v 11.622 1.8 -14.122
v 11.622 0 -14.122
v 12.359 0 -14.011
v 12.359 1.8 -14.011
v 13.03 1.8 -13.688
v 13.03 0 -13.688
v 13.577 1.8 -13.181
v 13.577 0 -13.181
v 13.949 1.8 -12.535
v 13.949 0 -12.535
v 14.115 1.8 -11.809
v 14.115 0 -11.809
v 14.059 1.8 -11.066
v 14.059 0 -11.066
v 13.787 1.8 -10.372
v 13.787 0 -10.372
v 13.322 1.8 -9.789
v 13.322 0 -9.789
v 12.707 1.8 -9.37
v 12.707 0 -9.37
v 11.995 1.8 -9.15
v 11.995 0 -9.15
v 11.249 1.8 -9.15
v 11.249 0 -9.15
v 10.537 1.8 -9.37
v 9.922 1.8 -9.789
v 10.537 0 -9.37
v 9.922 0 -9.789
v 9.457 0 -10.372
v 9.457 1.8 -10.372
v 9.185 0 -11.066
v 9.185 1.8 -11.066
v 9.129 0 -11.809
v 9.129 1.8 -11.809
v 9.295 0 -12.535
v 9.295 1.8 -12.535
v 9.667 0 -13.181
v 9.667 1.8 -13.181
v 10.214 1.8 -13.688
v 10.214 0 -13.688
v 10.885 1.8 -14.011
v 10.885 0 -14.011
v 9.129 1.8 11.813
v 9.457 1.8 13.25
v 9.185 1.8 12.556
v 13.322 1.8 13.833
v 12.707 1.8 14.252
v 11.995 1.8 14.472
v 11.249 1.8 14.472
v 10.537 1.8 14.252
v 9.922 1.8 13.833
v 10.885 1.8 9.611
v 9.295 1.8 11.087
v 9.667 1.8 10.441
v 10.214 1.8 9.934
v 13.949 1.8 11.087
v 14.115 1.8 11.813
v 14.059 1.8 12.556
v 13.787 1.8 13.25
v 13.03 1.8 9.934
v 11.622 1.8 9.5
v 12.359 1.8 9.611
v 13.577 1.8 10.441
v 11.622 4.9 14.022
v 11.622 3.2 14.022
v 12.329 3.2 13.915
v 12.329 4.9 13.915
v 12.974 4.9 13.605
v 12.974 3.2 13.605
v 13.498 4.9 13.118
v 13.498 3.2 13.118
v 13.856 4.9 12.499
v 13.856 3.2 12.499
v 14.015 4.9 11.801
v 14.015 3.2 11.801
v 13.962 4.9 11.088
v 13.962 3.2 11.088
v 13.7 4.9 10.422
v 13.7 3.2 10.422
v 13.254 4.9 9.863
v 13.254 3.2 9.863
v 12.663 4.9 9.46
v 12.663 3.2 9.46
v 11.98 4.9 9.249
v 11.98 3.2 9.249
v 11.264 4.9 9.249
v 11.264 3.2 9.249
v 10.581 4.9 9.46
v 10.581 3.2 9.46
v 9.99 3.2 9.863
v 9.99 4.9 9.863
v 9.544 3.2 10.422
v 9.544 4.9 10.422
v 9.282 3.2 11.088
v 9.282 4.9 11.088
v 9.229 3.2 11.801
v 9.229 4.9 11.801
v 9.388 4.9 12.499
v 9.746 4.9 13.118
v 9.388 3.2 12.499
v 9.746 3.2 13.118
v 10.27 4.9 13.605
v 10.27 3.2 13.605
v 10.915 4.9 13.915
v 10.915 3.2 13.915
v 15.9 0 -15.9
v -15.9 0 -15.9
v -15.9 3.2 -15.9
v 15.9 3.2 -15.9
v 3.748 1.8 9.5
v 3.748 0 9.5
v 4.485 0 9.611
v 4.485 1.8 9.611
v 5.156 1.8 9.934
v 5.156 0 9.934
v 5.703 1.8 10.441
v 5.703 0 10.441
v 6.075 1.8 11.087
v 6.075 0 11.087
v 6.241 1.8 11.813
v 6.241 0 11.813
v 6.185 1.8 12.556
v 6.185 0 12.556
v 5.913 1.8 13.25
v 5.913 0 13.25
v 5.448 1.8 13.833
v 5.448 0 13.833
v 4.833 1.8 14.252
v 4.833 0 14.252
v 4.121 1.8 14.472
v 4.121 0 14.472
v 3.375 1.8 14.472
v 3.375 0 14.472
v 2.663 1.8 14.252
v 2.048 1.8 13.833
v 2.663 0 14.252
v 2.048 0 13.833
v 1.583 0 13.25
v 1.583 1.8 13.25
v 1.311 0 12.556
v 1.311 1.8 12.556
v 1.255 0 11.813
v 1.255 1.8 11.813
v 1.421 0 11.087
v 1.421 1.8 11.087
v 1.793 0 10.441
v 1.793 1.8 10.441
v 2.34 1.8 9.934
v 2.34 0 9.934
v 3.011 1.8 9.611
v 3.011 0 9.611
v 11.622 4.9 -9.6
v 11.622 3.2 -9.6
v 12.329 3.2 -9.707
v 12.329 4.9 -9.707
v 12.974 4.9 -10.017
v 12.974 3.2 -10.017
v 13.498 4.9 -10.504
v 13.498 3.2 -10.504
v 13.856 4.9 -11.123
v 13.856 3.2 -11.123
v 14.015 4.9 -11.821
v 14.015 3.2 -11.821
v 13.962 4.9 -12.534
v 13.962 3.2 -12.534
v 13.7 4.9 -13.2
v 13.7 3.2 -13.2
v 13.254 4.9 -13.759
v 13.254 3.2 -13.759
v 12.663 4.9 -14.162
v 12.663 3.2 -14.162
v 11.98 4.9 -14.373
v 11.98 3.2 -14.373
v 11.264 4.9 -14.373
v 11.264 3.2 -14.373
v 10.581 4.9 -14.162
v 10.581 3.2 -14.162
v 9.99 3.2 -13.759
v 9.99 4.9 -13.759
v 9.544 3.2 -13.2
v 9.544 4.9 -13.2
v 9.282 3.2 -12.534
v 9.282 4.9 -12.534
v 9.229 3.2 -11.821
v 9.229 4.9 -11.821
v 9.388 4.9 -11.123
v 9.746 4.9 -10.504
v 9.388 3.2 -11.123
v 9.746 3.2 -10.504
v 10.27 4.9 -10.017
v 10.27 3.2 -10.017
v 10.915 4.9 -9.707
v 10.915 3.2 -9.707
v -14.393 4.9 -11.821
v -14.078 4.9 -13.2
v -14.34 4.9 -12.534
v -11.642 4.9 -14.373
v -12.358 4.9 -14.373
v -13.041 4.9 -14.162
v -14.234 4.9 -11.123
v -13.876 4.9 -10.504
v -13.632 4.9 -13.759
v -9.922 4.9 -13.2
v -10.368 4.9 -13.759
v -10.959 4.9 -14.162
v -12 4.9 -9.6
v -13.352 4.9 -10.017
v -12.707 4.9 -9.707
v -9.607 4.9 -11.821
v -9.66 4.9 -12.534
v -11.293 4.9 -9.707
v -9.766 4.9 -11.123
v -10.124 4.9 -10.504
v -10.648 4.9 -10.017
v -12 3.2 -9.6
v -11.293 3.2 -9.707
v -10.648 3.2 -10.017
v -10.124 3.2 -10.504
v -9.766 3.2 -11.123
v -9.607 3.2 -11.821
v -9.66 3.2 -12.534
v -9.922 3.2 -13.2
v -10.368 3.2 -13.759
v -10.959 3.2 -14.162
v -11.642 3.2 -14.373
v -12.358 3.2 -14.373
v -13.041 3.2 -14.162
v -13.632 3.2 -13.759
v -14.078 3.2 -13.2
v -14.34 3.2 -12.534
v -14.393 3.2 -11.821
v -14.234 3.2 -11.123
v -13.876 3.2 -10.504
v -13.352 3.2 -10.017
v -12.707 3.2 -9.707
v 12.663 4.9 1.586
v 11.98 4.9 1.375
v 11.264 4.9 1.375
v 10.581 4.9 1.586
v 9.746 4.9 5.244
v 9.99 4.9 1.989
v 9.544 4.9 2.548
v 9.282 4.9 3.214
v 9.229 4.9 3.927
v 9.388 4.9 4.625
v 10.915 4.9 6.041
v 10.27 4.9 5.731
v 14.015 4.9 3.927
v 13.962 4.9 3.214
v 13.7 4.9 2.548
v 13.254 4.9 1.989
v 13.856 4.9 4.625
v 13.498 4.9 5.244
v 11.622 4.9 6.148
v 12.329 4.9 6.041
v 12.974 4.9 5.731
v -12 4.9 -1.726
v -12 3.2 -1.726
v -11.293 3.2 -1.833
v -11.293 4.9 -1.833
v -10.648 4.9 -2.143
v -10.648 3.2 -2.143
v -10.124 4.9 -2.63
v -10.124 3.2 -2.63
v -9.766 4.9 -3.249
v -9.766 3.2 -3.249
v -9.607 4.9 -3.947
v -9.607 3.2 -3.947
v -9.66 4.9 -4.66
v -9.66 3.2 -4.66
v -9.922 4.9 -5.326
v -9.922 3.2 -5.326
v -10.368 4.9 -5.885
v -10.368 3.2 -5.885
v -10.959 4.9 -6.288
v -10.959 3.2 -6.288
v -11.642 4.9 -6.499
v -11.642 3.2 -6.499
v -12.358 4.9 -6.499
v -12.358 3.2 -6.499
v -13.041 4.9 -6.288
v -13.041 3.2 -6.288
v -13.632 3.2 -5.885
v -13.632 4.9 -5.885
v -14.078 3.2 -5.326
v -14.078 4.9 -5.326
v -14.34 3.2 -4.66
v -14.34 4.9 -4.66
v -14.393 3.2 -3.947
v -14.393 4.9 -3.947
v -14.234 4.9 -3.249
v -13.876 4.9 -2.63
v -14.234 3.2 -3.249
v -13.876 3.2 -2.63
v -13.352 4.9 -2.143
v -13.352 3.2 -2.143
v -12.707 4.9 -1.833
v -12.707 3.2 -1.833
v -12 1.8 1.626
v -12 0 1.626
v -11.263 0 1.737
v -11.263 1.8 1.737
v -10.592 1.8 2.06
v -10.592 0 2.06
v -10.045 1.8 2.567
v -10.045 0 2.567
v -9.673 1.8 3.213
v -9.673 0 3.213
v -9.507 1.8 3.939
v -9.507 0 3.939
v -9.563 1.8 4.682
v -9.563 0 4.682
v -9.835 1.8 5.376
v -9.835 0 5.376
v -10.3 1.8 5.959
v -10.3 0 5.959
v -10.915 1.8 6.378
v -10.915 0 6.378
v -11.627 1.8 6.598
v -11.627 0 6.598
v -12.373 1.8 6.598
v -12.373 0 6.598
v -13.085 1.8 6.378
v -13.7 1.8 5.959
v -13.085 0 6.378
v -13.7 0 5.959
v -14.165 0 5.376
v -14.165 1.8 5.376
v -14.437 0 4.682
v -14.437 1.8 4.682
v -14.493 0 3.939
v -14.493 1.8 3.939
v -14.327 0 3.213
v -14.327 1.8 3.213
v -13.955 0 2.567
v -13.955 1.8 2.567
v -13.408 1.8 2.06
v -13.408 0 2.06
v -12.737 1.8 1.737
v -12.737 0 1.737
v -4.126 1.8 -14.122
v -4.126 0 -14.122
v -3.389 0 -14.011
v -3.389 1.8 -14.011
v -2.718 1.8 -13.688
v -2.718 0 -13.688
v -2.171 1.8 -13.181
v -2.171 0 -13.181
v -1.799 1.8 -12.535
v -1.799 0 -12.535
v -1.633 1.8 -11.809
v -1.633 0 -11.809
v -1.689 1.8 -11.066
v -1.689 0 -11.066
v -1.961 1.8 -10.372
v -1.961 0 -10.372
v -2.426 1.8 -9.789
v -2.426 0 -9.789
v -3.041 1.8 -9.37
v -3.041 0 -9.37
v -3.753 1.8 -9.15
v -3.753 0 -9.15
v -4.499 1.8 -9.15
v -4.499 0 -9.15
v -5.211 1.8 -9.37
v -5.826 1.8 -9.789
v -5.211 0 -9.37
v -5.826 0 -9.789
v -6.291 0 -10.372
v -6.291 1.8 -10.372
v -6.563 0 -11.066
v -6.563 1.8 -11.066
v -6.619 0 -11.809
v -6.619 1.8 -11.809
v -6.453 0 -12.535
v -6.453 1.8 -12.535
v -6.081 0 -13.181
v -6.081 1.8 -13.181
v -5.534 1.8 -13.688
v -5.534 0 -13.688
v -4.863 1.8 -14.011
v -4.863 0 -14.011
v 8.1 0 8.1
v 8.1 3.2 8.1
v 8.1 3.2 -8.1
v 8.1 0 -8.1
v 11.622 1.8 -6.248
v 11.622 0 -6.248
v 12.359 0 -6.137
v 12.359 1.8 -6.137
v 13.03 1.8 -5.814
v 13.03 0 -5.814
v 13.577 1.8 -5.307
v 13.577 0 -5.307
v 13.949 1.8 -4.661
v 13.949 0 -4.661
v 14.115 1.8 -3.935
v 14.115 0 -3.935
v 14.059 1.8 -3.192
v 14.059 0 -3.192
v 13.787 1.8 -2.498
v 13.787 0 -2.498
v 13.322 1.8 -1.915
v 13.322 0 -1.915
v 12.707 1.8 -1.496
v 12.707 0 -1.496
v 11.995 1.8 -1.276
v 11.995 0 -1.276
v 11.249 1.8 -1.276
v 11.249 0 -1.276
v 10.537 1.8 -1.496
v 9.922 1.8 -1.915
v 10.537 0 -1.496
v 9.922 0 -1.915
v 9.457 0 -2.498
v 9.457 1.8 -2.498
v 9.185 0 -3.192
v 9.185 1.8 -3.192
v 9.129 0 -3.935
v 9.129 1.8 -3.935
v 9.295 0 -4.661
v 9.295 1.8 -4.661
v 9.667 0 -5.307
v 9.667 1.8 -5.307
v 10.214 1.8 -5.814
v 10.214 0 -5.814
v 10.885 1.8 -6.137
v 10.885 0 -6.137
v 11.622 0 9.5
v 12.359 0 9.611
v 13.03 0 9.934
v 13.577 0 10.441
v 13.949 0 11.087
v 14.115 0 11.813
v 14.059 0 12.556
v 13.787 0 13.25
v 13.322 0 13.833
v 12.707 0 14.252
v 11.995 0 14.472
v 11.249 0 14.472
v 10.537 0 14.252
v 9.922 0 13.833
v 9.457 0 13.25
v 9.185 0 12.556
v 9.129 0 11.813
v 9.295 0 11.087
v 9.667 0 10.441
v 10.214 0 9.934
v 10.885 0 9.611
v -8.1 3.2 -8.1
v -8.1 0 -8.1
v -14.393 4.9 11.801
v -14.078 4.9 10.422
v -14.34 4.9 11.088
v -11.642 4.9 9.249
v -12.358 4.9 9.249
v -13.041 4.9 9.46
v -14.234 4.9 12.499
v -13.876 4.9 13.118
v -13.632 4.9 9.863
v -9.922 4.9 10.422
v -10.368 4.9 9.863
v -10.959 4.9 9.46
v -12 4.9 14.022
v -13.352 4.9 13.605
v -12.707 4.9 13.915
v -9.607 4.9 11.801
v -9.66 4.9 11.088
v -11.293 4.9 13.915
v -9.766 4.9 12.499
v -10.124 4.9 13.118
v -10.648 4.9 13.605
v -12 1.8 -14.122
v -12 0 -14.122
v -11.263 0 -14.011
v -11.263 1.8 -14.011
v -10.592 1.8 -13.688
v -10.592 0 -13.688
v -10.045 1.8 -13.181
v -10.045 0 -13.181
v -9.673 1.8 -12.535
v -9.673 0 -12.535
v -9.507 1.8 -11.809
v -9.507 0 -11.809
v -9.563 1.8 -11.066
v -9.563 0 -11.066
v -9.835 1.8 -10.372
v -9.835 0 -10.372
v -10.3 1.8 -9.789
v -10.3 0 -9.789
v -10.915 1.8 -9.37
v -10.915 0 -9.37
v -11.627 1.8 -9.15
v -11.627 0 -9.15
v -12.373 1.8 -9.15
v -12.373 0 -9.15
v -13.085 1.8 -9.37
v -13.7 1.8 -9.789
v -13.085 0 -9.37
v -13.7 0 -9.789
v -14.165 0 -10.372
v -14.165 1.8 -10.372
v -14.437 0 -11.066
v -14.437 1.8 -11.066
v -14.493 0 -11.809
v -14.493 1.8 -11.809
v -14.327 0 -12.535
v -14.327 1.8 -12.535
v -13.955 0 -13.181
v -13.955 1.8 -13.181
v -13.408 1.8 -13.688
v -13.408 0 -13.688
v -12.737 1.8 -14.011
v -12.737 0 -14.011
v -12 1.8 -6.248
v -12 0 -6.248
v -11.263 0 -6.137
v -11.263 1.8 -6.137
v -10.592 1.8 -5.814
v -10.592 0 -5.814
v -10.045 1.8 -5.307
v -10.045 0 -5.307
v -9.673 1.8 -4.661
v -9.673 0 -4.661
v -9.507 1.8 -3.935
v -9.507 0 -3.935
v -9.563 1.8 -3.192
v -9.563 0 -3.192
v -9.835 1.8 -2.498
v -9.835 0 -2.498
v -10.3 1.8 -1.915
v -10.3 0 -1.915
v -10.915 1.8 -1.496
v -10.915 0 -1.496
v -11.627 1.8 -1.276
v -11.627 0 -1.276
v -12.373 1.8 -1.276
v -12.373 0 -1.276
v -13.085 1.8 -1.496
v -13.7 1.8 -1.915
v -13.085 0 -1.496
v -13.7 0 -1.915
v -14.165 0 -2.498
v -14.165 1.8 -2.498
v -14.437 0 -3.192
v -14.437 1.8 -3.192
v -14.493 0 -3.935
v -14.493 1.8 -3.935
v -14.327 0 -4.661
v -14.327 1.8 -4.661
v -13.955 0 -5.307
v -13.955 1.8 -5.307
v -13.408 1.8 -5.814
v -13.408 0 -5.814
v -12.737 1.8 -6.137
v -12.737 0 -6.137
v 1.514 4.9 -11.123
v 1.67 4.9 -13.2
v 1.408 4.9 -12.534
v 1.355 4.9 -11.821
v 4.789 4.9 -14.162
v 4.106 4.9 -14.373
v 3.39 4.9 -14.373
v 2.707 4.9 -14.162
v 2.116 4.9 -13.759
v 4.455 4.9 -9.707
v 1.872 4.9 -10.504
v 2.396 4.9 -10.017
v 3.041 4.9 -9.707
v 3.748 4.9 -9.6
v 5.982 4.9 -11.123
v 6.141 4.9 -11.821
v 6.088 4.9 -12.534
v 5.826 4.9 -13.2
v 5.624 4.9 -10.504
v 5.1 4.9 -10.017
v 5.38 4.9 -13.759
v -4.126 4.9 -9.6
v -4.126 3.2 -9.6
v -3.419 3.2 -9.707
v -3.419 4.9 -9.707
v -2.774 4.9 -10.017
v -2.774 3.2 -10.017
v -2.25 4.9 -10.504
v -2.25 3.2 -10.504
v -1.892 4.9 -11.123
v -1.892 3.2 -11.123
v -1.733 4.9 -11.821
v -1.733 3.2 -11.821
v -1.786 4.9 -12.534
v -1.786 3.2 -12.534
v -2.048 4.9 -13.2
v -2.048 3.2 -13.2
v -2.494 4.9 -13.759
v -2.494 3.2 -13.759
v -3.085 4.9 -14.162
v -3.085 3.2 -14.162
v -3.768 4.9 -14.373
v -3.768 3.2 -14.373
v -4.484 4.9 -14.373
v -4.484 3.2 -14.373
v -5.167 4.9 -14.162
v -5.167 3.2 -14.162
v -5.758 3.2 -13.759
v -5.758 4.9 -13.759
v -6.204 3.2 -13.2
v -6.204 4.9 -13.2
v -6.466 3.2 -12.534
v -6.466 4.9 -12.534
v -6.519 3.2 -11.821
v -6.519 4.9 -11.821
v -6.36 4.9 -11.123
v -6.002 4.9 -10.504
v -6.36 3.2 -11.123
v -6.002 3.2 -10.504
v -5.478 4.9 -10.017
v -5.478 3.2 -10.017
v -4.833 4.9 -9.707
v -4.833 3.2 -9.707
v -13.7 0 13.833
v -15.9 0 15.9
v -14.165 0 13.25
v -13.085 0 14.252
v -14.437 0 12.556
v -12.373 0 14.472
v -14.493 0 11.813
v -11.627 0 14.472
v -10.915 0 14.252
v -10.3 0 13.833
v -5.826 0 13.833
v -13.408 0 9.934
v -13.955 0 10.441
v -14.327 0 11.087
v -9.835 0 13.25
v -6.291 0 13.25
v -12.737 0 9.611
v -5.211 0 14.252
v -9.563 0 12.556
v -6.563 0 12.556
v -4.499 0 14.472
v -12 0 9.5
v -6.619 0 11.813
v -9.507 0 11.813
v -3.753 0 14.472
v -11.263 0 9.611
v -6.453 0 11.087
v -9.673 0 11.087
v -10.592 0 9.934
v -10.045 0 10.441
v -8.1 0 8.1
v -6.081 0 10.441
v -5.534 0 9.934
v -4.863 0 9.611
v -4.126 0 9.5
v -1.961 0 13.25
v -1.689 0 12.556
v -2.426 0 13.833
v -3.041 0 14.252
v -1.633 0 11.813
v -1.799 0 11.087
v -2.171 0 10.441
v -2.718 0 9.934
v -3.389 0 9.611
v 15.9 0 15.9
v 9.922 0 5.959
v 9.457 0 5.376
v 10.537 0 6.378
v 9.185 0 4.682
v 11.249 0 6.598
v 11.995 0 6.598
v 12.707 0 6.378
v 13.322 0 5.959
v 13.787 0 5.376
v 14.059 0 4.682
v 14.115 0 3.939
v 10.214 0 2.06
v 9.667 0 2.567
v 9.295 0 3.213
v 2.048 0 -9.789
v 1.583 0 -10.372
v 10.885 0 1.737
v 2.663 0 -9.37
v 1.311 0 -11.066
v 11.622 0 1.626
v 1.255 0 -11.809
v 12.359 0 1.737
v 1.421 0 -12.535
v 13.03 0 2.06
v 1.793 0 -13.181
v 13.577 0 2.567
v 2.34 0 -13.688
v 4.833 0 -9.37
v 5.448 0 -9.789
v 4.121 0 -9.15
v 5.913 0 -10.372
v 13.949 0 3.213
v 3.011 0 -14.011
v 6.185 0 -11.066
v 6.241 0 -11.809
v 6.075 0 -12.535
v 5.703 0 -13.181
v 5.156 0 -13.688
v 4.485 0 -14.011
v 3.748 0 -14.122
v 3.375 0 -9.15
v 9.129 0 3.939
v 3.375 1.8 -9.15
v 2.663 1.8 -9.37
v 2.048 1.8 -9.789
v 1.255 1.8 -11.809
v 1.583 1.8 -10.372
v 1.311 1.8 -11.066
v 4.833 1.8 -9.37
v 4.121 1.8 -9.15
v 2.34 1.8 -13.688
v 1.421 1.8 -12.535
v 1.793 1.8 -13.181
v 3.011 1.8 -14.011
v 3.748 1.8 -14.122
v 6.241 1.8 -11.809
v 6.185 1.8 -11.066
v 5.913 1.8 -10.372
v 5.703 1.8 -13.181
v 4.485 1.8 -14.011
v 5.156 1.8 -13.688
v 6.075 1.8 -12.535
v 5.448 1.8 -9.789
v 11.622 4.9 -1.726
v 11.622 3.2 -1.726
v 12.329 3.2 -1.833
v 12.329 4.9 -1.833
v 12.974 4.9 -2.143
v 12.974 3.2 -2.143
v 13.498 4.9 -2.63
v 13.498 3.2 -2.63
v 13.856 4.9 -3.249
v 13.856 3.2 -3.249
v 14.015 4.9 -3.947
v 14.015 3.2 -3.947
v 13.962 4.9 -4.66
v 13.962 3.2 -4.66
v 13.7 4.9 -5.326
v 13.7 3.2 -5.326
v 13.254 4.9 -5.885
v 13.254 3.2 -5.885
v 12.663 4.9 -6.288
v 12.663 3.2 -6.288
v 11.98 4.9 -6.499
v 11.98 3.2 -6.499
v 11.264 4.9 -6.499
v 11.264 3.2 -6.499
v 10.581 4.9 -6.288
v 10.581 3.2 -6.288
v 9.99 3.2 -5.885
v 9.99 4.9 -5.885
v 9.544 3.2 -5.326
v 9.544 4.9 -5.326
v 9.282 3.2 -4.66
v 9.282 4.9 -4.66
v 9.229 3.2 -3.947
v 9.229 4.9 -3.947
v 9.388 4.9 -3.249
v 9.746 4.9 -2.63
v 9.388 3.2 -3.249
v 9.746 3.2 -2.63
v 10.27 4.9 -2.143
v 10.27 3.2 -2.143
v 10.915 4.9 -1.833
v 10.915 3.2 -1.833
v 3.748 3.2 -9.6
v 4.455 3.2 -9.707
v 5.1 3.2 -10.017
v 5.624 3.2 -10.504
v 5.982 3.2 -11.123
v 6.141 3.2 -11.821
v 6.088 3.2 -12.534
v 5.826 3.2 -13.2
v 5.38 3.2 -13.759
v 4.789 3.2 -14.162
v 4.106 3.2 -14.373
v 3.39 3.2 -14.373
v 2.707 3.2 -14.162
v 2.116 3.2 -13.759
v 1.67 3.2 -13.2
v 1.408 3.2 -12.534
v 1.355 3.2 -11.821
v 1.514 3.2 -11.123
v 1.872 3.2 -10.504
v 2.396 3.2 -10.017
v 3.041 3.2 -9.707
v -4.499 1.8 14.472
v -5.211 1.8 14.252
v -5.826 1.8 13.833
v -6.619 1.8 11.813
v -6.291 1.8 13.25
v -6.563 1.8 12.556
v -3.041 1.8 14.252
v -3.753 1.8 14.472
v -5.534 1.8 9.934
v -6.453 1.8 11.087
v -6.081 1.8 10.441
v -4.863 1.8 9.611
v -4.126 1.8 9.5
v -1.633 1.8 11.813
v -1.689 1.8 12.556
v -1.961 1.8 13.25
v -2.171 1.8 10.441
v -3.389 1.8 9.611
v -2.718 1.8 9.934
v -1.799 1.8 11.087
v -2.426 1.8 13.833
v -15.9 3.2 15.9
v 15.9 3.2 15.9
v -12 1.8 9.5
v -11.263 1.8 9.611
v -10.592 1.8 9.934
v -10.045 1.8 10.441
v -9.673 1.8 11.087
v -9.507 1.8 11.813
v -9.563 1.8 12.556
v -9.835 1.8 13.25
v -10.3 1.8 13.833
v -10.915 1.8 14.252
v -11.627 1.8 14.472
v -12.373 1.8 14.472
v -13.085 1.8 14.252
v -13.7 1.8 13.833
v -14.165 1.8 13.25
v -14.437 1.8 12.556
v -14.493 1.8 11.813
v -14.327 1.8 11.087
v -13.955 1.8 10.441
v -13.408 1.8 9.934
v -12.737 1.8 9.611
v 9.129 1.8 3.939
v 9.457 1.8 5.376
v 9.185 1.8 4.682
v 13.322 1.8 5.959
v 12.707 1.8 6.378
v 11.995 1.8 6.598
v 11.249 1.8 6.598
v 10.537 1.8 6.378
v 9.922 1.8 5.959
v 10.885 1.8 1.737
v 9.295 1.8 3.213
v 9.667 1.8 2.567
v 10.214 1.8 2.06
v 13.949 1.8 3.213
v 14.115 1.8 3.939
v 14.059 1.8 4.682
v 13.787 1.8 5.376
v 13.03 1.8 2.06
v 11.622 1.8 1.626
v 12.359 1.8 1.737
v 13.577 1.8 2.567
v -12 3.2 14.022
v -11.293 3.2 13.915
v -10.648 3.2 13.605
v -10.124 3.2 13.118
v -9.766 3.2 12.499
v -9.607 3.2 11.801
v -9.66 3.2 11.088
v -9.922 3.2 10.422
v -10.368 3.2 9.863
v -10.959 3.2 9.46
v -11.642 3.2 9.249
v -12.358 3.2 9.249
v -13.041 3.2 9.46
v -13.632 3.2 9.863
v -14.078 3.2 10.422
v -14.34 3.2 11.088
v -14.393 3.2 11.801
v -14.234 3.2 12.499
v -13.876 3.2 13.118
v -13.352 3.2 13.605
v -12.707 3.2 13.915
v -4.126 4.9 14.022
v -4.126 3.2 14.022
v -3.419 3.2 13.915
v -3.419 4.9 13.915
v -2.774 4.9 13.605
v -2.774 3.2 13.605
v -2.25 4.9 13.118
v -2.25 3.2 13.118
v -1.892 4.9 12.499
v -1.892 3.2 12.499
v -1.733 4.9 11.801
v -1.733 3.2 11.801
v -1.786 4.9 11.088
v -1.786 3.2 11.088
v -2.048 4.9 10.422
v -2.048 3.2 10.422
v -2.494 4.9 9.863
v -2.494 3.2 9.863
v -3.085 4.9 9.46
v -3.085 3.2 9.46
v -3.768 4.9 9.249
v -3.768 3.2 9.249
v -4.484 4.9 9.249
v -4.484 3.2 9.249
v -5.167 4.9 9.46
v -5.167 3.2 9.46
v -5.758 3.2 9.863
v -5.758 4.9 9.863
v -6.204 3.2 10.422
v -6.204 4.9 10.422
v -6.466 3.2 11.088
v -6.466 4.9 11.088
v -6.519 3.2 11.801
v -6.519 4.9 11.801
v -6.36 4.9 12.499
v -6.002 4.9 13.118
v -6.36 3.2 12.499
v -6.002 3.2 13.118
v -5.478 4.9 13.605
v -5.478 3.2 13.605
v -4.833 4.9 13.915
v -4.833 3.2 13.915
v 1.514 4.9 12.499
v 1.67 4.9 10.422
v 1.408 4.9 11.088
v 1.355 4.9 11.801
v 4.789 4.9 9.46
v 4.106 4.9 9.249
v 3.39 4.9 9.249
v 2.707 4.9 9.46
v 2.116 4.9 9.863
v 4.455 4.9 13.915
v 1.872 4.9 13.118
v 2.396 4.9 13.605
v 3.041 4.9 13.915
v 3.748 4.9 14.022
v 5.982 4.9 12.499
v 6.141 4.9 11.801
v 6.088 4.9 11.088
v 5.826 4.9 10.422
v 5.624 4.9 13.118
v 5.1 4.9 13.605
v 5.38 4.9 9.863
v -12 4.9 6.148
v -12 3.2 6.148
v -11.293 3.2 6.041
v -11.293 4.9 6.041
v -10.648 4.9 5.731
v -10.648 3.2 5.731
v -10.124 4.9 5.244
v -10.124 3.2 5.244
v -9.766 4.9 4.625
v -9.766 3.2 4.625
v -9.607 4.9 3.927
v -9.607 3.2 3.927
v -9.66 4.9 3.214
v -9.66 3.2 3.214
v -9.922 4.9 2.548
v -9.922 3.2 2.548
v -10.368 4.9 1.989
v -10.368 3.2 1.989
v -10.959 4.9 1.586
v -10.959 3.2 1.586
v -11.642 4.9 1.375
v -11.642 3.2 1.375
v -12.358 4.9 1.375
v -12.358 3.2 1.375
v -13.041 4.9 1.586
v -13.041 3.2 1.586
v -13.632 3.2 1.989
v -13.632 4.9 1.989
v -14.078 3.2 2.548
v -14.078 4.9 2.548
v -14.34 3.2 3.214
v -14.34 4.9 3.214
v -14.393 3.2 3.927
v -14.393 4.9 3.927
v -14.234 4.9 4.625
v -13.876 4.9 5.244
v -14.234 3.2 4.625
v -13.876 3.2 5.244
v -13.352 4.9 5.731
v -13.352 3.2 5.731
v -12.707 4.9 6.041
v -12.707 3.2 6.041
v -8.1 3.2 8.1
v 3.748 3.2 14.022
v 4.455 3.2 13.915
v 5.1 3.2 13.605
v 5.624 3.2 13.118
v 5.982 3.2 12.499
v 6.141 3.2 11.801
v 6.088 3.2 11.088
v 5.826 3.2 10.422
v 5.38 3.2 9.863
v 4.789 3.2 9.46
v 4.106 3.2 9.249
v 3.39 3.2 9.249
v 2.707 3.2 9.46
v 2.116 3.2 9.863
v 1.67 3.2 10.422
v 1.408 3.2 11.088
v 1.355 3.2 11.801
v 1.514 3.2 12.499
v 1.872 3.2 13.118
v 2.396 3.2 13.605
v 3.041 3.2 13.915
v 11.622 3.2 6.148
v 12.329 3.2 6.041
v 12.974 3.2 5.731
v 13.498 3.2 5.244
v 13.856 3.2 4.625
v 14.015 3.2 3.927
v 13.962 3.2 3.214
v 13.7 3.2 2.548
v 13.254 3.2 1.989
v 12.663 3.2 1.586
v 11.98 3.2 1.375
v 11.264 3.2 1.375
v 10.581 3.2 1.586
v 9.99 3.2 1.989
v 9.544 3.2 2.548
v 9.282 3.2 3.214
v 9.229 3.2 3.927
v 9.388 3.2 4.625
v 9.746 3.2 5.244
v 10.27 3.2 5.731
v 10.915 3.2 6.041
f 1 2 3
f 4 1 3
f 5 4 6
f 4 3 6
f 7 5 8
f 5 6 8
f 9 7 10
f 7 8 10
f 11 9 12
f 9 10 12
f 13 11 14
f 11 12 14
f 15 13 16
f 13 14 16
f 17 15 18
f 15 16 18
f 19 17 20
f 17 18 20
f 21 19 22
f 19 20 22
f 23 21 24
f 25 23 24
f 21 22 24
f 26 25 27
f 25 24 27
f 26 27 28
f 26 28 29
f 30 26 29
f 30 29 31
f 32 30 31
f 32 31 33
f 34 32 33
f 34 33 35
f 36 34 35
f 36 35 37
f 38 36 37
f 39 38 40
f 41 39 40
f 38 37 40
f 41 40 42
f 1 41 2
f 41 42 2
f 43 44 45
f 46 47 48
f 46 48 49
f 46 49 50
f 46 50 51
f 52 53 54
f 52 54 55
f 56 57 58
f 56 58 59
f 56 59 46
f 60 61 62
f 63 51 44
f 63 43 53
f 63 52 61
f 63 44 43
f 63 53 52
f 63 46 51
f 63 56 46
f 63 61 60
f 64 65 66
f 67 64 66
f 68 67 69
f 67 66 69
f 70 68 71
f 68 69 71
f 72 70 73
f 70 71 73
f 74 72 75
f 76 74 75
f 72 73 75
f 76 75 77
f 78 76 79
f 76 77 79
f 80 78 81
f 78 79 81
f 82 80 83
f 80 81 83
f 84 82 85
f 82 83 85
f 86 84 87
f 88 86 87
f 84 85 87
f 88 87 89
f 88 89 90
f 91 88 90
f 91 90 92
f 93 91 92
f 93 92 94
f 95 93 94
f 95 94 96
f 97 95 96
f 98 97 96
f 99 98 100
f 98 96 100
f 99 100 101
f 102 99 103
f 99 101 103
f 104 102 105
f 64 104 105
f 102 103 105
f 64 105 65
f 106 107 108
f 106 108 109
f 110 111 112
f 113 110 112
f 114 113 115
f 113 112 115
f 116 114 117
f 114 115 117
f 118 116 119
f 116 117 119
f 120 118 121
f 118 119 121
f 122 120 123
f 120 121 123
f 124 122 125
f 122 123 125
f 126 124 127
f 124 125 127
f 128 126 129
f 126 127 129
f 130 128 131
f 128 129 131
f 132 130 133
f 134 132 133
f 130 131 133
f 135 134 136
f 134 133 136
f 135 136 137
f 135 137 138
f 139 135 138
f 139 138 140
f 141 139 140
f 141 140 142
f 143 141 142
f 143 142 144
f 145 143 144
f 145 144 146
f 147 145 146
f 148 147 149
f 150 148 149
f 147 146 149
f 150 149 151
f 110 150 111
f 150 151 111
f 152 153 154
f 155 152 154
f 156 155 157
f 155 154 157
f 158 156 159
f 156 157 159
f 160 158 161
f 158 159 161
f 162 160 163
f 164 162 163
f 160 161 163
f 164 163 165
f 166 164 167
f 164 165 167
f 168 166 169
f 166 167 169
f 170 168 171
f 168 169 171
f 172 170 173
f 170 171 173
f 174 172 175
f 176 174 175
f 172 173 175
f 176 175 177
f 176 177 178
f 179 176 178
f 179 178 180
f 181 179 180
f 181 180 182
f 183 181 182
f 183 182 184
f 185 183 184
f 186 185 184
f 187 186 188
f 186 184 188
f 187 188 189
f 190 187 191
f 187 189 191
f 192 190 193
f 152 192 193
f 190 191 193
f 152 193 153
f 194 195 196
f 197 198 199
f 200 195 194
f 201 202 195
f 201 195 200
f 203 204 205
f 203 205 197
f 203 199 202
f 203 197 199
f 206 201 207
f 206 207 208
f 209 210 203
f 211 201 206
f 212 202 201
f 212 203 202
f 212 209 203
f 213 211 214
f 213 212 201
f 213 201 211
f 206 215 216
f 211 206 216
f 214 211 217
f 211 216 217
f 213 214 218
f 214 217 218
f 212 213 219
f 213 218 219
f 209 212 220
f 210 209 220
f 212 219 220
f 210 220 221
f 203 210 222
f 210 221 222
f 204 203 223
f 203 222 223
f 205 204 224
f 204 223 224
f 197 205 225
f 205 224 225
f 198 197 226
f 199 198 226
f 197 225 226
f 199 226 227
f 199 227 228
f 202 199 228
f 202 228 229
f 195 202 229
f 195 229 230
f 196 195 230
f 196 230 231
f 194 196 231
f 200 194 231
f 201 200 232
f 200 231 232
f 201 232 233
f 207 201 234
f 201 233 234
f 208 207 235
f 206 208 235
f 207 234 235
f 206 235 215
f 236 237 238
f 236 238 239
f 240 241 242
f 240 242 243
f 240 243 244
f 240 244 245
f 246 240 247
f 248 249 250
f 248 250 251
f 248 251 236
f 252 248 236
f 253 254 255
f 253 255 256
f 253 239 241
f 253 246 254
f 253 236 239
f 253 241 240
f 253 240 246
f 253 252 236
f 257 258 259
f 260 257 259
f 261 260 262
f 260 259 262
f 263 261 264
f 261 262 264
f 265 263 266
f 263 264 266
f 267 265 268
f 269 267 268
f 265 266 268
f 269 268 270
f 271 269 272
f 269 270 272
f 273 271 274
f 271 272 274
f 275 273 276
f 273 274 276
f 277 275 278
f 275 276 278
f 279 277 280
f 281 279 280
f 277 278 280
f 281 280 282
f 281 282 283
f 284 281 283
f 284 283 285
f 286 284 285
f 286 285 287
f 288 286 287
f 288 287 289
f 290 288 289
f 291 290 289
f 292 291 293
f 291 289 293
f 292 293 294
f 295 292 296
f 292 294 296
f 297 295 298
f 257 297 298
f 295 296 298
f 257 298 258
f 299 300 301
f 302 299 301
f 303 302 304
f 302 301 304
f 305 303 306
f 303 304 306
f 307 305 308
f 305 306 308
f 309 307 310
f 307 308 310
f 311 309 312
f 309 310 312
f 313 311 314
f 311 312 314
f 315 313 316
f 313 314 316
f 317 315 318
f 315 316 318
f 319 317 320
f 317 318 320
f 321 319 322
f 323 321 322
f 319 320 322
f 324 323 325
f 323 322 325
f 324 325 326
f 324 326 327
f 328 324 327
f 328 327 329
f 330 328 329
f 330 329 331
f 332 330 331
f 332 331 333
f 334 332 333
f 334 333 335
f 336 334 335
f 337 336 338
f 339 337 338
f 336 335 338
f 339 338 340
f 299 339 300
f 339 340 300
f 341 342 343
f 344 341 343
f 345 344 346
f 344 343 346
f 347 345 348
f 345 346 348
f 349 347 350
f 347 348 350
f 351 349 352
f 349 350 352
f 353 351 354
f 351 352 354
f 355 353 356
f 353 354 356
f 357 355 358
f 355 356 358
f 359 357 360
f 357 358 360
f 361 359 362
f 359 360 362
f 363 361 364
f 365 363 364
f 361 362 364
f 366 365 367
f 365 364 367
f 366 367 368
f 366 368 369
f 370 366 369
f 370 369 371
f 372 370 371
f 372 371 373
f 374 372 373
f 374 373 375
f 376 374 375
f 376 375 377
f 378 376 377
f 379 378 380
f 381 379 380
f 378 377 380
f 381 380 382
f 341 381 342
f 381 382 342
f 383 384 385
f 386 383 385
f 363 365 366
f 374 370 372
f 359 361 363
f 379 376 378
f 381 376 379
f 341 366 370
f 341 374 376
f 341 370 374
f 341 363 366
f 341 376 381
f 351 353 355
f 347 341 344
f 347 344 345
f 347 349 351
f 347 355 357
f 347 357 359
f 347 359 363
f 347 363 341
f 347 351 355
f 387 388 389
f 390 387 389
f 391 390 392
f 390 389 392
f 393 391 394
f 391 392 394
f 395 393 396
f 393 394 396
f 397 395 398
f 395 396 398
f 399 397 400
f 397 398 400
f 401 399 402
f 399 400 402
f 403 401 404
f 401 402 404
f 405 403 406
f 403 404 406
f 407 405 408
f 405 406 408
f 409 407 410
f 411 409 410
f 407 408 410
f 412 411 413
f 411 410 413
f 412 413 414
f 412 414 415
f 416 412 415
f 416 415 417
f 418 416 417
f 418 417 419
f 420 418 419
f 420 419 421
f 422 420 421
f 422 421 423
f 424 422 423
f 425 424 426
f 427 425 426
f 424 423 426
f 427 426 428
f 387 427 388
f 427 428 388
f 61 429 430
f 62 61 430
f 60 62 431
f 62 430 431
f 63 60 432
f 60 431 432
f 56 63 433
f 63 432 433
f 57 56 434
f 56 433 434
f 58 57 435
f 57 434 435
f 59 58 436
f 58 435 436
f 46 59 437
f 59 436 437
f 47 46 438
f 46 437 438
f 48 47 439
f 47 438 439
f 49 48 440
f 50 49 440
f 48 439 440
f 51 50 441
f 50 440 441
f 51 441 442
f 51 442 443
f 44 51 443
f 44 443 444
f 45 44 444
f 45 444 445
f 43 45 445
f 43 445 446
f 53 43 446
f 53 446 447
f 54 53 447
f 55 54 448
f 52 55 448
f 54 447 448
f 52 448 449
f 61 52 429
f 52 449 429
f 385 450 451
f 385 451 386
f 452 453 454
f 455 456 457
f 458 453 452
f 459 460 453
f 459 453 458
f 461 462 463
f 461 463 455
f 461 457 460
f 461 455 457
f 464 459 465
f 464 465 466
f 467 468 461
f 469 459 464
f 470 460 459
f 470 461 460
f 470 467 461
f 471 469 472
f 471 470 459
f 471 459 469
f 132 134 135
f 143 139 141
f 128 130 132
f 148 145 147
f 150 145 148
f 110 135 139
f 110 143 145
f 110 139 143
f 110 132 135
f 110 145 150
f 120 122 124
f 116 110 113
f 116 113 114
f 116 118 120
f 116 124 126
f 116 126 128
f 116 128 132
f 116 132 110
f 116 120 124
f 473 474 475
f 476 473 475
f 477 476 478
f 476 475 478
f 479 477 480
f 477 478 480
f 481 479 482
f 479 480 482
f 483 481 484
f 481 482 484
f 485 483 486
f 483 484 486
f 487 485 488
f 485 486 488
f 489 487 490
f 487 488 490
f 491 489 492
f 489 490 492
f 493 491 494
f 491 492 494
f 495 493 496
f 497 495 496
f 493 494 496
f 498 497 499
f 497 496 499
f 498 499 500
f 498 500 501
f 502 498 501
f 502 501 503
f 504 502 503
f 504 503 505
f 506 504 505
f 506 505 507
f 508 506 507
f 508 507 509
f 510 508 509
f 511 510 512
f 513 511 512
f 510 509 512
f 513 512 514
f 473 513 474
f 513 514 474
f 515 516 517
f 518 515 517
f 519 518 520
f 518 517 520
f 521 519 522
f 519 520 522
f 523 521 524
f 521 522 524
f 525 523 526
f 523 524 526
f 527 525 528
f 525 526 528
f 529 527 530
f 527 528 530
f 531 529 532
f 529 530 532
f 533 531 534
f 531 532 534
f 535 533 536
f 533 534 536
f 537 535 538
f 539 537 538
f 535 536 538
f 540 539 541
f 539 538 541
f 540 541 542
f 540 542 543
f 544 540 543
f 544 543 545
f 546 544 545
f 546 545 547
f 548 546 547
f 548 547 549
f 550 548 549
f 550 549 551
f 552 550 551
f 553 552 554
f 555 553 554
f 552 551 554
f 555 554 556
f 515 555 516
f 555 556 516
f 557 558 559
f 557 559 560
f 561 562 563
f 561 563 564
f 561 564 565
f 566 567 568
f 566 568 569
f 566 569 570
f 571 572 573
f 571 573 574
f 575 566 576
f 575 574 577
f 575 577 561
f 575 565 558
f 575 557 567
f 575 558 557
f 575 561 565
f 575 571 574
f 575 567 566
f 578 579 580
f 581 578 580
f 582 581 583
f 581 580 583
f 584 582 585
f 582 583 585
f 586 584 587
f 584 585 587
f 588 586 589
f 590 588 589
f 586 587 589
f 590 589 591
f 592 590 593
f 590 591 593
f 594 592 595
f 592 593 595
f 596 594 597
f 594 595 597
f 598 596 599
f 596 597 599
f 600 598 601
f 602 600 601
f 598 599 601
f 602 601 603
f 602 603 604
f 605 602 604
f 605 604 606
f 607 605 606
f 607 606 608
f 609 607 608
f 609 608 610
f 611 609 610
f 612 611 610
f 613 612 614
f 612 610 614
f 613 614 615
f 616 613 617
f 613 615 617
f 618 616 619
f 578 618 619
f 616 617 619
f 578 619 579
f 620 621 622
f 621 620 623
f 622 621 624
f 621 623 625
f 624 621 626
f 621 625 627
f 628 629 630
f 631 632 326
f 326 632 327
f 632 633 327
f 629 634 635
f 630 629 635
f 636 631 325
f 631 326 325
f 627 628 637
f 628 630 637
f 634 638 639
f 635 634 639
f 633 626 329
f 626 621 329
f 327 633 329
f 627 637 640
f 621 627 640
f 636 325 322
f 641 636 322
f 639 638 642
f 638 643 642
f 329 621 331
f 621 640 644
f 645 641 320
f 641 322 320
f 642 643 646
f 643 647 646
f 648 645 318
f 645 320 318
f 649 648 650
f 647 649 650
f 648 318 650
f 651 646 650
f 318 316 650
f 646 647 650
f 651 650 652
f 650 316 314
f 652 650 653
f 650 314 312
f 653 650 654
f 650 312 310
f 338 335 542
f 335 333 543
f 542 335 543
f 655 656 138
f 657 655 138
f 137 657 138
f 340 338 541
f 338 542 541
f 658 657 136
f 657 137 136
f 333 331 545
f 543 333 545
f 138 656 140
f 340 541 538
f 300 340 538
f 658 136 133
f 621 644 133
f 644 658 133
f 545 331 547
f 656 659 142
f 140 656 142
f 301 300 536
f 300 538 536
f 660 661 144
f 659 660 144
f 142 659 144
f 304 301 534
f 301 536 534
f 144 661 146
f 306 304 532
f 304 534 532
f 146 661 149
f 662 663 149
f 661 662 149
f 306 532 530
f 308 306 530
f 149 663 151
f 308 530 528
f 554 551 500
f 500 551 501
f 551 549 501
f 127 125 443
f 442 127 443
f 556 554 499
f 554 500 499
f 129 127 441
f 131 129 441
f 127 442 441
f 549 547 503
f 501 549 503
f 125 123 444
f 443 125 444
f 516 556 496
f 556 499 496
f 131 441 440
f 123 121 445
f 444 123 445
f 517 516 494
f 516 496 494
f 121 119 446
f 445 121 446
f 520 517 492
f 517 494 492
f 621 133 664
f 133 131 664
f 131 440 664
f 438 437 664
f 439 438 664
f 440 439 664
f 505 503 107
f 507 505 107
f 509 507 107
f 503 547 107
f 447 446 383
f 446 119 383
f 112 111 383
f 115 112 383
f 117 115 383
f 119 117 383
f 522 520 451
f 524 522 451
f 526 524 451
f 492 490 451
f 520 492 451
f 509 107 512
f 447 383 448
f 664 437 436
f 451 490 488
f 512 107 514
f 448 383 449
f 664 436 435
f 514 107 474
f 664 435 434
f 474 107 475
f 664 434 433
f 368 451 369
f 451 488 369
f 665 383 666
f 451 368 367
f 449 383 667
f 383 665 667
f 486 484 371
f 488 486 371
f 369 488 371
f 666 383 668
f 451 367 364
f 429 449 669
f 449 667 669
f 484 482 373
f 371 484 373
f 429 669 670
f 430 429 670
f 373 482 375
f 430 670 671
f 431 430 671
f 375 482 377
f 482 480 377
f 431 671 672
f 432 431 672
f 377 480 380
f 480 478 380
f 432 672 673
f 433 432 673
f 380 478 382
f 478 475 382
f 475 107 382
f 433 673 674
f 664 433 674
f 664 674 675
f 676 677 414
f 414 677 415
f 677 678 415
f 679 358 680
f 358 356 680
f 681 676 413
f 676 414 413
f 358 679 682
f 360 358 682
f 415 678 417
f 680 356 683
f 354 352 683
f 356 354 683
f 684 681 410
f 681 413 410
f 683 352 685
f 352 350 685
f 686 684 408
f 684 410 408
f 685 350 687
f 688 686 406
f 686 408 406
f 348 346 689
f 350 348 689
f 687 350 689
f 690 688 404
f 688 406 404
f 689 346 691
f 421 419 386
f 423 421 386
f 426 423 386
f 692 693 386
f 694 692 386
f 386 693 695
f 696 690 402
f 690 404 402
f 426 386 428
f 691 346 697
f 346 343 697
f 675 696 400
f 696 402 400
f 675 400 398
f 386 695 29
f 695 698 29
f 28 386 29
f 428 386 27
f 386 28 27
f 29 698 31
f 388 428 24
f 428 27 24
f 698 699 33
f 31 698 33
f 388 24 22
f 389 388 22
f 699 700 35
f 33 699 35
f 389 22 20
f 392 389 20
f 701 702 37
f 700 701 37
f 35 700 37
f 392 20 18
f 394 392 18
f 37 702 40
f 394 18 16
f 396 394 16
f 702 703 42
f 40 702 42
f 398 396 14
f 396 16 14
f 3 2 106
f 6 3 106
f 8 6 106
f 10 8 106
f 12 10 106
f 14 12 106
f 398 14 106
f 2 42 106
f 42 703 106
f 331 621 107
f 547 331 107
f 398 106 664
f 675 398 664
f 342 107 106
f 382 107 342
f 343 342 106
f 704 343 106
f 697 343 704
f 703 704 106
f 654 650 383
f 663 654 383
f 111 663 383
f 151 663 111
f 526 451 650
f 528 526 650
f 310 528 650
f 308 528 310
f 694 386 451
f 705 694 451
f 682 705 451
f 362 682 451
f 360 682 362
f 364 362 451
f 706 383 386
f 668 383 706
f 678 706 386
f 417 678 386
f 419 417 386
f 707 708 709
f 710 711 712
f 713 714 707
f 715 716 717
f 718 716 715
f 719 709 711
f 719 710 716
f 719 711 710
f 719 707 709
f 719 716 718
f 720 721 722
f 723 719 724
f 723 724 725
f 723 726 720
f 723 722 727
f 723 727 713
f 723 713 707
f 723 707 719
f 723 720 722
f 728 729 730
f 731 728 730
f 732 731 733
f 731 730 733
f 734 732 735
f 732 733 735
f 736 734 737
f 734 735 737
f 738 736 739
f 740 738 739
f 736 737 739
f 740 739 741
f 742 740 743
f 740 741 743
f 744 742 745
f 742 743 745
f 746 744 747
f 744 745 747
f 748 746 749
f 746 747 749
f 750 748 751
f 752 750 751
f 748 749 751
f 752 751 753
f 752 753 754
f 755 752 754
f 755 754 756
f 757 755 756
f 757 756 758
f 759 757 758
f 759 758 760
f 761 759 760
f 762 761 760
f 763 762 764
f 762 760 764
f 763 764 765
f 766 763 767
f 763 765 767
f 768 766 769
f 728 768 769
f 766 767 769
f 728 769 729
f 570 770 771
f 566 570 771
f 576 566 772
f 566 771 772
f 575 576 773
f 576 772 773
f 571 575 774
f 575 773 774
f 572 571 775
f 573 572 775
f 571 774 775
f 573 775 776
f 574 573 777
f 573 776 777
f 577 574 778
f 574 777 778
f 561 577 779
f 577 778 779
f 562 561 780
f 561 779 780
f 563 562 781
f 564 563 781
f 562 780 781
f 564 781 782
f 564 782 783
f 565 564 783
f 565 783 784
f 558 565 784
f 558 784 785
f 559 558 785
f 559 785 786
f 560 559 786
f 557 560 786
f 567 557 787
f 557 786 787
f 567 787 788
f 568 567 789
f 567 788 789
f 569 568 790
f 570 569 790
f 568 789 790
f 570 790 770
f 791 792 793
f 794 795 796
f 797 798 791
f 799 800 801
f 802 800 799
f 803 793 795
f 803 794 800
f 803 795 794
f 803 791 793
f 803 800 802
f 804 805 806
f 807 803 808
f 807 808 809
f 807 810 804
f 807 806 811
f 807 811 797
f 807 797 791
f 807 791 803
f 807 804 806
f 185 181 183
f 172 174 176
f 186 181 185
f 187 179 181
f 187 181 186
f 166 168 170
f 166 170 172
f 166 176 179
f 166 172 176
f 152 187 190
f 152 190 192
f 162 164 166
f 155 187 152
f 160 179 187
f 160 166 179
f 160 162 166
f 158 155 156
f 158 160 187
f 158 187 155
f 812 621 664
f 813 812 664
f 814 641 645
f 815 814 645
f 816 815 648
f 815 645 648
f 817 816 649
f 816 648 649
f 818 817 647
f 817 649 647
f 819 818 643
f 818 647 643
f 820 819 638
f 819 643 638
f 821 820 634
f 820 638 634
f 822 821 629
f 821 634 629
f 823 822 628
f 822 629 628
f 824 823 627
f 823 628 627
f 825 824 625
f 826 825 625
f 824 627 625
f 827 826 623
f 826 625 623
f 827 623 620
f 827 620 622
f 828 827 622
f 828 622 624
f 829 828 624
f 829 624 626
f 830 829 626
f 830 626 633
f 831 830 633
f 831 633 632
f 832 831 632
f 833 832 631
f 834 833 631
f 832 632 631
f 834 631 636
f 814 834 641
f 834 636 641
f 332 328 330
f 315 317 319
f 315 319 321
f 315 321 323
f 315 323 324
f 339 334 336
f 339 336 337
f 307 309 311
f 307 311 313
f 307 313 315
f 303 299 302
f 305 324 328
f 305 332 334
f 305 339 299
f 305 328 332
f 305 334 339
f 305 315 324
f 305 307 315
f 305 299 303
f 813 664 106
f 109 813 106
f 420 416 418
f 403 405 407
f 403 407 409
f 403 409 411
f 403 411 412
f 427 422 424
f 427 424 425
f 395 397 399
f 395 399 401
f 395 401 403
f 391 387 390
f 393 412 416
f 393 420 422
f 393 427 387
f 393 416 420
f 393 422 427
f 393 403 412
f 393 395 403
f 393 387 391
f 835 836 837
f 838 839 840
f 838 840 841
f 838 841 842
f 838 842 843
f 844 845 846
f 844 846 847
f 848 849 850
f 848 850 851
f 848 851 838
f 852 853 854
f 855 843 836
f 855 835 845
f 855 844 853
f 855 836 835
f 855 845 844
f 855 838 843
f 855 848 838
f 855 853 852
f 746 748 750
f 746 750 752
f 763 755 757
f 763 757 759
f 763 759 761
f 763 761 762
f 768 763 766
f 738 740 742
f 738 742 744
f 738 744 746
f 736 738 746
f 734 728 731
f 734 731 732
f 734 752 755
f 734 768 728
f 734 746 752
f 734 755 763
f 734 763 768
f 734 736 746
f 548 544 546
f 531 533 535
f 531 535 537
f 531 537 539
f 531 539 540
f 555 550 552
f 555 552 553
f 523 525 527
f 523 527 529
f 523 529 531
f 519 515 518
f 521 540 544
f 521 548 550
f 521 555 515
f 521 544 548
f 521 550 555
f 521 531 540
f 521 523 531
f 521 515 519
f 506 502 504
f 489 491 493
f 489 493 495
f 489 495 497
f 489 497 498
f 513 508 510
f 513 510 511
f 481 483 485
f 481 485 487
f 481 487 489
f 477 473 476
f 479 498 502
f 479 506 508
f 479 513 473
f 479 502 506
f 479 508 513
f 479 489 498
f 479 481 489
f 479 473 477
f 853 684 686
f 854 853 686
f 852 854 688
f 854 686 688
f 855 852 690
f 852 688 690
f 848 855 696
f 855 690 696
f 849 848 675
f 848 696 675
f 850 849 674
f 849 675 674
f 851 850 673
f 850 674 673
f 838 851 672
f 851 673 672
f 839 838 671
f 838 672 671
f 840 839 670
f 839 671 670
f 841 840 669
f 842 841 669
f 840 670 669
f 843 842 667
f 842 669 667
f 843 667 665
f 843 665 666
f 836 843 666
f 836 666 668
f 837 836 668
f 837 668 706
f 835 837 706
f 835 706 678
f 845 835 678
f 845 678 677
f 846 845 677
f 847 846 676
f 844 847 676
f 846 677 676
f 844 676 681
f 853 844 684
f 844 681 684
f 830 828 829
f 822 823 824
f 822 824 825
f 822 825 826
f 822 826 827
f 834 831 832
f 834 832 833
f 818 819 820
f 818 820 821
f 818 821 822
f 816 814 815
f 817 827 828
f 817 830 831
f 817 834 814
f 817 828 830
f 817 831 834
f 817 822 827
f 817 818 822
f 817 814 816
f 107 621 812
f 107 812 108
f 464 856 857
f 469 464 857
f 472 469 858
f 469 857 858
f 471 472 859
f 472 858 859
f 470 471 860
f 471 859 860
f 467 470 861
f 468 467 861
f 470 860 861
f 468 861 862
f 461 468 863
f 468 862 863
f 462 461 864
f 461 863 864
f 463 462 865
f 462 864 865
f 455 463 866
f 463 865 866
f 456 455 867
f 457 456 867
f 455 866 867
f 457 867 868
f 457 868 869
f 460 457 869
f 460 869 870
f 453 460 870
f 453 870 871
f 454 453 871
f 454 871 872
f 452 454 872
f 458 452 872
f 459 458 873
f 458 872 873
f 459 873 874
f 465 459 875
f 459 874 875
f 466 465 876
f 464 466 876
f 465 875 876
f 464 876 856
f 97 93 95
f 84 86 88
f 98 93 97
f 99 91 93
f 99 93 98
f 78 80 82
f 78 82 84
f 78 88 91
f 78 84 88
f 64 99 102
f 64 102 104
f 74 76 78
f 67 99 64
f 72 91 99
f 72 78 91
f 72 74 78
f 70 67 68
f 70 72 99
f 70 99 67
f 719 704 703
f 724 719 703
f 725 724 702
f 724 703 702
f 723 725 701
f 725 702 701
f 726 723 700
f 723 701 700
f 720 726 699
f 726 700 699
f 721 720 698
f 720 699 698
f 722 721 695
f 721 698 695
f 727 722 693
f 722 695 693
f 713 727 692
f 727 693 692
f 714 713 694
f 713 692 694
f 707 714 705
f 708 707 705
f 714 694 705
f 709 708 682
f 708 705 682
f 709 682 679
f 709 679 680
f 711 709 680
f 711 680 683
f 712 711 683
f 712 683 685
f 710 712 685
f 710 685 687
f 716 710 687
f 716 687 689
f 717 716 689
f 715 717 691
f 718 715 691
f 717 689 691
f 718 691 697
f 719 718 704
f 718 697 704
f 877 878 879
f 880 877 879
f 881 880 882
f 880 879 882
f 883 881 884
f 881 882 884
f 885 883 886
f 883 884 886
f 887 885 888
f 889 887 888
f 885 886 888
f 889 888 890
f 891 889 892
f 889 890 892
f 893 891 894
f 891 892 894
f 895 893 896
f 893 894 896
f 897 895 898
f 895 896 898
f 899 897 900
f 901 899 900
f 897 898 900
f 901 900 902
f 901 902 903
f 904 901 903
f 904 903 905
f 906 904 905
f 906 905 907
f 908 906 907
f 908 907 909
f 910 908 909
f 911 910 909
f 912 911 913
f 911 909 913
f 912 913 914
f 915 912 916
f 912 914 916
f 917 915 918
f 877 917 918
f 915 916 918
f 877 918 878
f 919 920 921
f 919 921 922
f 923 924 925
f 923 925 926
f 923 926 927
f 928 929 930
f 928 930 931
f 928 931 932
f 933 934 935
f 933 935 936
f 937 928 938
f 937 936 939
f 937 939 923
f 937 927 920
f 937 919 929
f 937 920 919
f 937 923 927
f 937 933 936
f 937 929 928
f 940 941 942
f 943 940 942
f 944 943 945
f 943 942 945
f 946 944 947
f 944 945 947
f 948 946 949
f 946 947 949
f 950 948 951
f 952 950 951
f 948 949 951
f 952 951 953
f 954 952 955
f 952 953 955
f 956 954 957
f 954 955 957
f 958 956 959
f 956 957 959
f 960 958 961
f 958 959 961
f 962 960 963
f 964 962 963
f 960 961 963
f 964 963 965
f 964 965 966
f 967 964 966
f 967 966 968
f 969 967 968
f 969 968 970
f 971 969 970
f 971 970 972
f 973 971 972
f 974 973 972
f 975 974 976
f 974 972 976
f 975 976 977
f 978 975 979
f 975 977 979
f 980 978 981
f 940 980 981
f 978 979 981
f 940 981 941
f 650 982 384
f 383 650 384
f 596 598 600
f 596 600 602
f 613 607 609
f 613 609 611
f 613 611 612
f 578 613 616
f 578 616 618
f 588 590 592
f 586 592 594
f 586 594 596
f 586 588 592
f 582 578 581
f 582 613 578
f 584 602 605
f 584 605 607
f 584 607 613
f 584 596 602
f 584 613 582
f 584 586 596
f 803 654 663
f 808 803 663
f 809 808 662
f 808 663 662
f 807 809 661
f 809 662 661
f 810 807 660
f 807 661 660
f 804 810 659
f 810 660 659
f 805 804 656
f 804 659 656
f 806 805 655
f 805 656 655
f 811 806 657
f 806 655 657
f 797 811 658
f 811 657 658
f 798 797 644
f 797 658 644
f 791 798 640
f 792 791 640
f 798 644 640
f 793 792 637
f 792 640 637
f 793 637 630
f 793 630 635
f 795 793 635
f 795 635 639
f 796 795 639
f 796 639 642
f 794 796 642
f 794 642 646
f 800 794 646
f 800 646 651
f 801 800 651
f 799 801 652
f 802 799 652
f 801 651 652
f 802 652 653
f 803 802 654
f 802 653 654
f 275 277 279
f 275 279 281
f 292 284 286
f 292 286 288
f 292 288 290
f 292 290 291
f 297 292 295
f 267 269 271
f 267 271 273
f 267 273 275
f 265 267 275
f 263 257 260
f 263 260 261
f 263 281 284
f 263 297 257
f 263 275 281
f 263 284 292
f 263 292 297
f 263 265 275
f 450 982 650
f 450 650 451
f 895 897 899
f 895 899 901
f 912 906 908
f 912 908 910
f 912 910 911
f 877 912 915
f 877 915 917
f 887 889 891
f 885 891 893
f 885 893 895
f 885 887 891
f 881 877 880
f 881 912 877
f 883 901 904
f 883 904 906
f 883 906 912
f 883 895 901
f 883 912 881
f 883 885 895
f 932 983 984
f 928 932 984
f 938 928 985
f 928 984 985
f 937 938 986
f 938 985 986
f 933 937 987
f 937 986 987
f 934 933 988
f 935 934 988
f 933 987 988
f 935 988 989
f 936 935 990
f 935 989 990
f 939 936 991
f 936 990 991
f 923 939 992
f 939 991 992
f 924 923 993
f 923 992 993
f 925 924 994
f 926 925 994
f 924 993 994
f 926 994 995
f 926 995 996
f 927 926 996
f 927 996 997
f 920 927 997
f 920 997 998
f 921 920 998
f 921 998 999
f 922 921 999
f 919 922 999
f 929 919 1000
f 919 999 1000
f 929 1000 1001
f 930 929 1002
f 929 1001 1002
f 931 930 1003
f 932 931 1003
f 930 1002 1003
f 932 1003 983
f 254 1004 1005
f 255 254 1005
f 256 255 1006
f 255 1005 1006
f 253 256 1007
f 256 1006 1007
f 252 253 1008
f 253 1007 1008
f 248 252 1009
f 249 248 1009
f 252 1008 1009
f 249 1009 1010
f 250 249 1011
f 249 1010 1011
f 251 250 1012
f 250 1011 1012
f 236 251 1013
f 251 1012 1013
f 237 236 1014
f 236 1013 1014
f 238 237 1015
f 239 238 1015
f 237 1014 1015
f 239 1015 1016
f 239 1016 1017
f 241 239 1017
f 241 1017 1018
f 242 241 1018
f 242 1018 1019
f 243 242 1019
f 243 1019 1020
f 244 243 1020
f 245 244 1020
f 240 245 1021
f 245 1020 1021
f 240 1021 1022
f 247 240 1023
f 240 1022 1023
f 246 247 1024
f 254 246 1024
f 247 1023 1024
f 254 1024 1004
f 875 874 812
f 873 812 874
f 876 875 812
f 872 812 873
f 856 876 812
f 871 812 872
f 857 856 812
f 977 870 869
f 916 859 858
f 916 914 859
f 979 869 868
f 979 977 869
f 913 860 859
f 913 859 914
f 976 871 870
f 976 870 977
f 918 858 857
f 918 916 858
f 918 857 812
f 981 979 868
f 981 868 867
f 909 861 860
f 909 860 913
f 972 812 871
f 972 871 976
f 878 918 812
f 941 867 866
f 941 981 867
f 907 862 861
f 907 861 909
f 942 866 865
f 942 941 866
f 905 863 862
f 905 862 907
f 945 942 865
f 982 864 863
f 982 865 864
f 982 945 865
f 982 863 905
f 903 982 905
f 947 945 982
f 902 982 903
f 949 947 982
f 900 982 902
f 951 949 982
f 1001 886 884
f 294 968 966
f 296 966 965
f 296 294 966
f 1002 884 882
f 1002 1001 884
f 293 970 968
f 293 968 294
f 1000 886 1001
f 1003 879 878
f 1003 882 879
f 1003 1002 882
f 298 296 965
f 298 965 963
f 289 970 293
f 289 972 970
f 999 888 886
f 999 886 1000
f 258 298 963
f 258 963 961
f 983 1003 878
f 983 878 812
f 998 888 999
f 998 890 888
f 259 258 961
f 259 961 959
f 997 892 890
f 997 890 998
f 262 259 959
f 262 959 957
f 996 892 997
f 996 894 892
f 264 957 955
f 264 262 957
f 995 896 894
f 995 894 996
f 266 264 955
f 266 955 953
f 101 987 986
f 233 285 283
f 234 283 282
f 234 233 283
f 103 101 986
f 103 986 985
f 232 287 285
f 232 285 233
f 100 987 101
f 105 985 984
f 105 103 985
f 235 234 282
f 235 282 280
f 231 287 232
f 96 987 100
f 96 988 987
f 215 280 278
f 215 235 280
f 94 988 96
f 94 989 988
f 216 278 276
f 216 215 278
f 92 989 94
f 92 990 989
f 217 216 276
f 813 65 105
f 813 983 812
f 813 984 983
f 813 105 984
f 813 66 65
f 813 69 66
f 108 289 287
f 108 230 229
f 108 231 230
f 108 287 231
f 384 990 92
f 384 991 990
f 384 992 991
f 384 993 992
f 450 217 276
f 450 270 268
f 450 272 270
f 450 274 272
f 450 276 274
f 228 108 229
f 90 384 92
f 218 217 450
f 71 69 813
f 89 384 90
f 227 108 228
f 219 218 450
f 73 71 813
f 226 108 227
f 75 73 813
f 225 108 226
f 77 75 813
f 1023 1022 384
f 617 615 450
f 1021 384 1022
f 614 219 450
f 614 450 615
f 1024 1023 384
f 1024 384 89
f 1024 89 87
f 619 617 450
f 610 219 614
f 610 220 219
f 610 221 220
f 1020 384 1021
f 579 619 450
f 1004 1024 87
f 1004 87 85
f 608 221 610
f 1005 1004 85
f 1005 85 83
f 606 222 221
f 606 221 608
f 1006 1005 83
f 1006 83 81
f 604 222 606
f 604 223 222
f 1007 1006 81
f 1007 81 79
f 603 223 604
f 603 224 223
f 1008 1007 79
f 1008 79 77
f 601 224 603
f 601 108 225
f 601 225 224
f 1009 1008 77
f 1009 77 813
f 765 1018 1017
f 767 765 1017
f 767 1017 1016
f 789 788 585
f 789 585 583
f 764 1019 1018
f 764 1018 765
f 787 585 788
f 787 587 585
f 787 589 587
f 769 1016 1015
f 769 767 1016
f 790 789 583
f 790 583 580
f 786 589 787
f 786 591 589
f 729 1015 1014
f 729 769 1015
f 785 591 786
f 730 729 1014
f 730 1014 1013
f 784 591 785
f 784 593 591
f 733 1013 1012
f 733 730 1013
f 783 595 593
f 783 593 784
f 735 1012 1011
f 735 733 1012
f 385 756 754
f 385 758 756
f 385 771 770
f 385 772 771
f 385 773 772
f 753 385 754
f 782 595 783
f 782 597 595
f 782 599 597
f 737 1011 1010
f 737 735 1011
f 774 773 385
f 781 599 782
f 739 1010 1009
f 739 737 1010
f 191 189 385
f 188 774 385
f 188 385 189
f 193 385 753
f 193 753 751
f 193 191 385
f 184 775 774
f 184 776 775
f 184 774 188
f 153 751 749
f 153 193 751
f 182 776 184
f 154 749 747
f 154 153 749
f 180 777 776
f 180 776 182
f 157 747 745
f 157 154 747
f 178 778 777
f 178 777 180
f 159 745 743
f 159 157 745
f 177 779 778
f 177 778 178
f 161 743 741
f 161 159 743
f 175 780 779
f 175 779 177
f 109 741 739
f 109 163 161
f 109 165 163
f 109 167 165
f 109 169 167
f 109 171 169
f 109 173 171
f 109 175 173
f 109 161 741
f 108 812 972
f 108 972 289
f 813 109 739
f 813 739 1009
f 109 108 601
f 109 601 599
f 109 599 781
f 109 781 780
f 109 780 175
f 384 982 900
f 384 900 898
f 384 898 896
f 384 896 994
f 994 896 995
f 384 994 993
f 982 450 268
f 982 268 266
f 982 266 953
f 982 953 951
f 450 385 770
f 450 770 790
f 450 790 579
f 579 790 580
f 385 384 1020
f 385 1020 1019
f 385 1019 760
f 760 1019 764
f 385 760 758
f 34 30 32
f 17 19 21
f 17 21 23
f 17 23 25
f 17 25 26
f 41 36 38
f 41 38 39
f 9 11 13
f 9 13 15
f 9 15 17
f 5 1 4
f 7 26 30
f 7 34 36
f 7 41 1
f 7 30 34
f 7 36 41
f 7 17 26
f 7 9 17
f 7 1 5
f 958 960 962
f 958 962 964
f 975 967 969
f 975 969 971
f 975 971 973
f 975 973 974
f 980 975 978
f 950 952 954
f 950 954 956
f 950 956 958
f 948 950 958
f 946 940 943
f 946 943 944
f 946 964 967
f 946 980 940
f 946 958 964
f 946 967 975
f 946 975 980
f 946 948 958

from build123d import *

# Parameters (mm, degrees)
SKETCH_1_W          = 31.8
SKETCH_1_H          = 31.8
EXTRUDE_1_DEPTH     = 3.2
SKETCH_2_W          = 16.2
SKETCH_2_H          = 16.2
CUT_EXTRUDE_3_DEPTH = 23.712551596
SKETCH_3_R          = 2.4
EXTRUDE_2_DEPTH     = 1.7
SKETCH_4_R          = 2.5
CUT_EXTRUDE_4_DEPTH = 1.8


with BuildPart() as part:
    # Эскиз1 → Бобышка-Вытянуть1 (new body)
    with BuildSketch(Plane(origin=(0, 0, 0), x_dir=(1, 0, 0), z_dir=(0, 1, 0))):
        Rectangle(SKETCH_1_W, SKETCH_1_H)
    extrude(amount=EXTRUDE_1_DEPTH)

    # Эскиз2 → Вырез-Вытянуть3 (cut, through all)
    with BuildSketch(Plane(origin=(0, 3.2, 0), x_dir=(1, 0, 0), z_dir=(0, 1, 0))):
        Rectangle(SKETCH_2_W, SKETCH_2_H)
    extrude(amount=-CUT_EXTRUDE_3_DEPTH, mode=Mode.SUBTRACT)

    # Эскиз3 → Бобышка-Вытянуть2 (add)
    with BuildSketch(Plane(origin=(0, 3.2, 0), x_dir=(1, 0, 0), z_dir=(0, 1, 0))):
        with Locations(Location((-12, 12, 0), (0, 0, 270))):
            Circle(SKETCH_3_R)
        with Locations(Location((-4.126, 12, 0), (0, 0, 270))):
            Circle(SKETCH_3_R)
        with Locations(Location((3.748, 12, 0), (0, 0, 270))):
            Circle(SKETCH_3_R)
        with Locations(Location((11.622, 12, 0), (0, 0, 270))):
            Circle(SKETCH_3_R)
        with Locations(Location((-12, 4.126, 0), (0, 0, 270))):
            Circle(SKETCH_3_R)
        with Locations(Location((-12, -3.748, 0), (0, 0, 270))):
            Circle(SKETCH_3_R)
        with Locations(Location((-12, -11.622, 0), (0, 0, 270))):
            Circle(SKETCH_3_R)
        with Locations(Location((-4.126, -11.622, 0), (0, 0, 270))):
            Circle(SKETCH_3_R)
        with Locations(Location((3.748, -11.622, 0), (0, 0, 270))):
            Circle(SKETCH_3_R)
        with Locations(Location((11.622, -11.622, 0), (0, 0, 270))):
            Circle(SKETCH_3_R)
        with Locations(Location((11.622, -3.748, 0), (0, 0, 270))):
            Circle(SKETCH_3_R)
        with Locations(Location((11.622, 4.126, 0), (0, 0, 270))):
            Circle(SKETCH_3_R)
    extrude(amount=EXTRUDE_2_DEPTH)

    # Эскиз4 → Вырез-Вытянуть4 (cut)
    with BuildSketch(Plane.XZ):
        with Locations(Location((-12, 12, 0), (0, 0, 270))):
            Circle(SKETCH_4_R)
        with Locations(Location((-4.126, 12, 0), (0, 0, 270))):
            Circle(SKETCH_4_R)
        with Locations(Location((3.748, 12, 0), (0, 0, 270))):
            Circle(SKETCH_4_R)
        with Locations(Location((11.622, 12, 0), (0, 0, 270))):
            Circle(SKETCH_4_R)
        with Locations(Location((-12, 4.126, 0), (0, 0, 270))):
            Circle(SKETCH_4_R)
        with Locations(Location((11.622, 4.126, 0), (0, 0, 270))):
            Circle(SKETCH_4_R)
        with Locations(Location((-12, -3.748, 0), (0, 0, 270))):
            Circle(SKETCH_4_R)
        with Locations(Location((11.622, -3.748, 0), (0, 0, 270))):
            Circle(SKETCH_4_R)
        with Locations(Location((-12, -11.622, 0), (0, 0, 270))):
            Circle(SKETCH_4_R)
        with Locations(Location((11.622, -11.622, 0), (0, 0, 270))):
            Circle(SKETCH_4_R)
        with Locations(Location((-4.126, -11.622, 0), (0, 0, 270))):
            Circle(SKETCH_4_R)
        with Locations(Location((3.748, -11.622, 0), (0, 0, 270))):
            Circle(SKETCH_4_R)
    extrude(amount=-CUT_EXTRUDE_4_DEPTH, mode=Mode.SUBTRACT)


solid = part.part
